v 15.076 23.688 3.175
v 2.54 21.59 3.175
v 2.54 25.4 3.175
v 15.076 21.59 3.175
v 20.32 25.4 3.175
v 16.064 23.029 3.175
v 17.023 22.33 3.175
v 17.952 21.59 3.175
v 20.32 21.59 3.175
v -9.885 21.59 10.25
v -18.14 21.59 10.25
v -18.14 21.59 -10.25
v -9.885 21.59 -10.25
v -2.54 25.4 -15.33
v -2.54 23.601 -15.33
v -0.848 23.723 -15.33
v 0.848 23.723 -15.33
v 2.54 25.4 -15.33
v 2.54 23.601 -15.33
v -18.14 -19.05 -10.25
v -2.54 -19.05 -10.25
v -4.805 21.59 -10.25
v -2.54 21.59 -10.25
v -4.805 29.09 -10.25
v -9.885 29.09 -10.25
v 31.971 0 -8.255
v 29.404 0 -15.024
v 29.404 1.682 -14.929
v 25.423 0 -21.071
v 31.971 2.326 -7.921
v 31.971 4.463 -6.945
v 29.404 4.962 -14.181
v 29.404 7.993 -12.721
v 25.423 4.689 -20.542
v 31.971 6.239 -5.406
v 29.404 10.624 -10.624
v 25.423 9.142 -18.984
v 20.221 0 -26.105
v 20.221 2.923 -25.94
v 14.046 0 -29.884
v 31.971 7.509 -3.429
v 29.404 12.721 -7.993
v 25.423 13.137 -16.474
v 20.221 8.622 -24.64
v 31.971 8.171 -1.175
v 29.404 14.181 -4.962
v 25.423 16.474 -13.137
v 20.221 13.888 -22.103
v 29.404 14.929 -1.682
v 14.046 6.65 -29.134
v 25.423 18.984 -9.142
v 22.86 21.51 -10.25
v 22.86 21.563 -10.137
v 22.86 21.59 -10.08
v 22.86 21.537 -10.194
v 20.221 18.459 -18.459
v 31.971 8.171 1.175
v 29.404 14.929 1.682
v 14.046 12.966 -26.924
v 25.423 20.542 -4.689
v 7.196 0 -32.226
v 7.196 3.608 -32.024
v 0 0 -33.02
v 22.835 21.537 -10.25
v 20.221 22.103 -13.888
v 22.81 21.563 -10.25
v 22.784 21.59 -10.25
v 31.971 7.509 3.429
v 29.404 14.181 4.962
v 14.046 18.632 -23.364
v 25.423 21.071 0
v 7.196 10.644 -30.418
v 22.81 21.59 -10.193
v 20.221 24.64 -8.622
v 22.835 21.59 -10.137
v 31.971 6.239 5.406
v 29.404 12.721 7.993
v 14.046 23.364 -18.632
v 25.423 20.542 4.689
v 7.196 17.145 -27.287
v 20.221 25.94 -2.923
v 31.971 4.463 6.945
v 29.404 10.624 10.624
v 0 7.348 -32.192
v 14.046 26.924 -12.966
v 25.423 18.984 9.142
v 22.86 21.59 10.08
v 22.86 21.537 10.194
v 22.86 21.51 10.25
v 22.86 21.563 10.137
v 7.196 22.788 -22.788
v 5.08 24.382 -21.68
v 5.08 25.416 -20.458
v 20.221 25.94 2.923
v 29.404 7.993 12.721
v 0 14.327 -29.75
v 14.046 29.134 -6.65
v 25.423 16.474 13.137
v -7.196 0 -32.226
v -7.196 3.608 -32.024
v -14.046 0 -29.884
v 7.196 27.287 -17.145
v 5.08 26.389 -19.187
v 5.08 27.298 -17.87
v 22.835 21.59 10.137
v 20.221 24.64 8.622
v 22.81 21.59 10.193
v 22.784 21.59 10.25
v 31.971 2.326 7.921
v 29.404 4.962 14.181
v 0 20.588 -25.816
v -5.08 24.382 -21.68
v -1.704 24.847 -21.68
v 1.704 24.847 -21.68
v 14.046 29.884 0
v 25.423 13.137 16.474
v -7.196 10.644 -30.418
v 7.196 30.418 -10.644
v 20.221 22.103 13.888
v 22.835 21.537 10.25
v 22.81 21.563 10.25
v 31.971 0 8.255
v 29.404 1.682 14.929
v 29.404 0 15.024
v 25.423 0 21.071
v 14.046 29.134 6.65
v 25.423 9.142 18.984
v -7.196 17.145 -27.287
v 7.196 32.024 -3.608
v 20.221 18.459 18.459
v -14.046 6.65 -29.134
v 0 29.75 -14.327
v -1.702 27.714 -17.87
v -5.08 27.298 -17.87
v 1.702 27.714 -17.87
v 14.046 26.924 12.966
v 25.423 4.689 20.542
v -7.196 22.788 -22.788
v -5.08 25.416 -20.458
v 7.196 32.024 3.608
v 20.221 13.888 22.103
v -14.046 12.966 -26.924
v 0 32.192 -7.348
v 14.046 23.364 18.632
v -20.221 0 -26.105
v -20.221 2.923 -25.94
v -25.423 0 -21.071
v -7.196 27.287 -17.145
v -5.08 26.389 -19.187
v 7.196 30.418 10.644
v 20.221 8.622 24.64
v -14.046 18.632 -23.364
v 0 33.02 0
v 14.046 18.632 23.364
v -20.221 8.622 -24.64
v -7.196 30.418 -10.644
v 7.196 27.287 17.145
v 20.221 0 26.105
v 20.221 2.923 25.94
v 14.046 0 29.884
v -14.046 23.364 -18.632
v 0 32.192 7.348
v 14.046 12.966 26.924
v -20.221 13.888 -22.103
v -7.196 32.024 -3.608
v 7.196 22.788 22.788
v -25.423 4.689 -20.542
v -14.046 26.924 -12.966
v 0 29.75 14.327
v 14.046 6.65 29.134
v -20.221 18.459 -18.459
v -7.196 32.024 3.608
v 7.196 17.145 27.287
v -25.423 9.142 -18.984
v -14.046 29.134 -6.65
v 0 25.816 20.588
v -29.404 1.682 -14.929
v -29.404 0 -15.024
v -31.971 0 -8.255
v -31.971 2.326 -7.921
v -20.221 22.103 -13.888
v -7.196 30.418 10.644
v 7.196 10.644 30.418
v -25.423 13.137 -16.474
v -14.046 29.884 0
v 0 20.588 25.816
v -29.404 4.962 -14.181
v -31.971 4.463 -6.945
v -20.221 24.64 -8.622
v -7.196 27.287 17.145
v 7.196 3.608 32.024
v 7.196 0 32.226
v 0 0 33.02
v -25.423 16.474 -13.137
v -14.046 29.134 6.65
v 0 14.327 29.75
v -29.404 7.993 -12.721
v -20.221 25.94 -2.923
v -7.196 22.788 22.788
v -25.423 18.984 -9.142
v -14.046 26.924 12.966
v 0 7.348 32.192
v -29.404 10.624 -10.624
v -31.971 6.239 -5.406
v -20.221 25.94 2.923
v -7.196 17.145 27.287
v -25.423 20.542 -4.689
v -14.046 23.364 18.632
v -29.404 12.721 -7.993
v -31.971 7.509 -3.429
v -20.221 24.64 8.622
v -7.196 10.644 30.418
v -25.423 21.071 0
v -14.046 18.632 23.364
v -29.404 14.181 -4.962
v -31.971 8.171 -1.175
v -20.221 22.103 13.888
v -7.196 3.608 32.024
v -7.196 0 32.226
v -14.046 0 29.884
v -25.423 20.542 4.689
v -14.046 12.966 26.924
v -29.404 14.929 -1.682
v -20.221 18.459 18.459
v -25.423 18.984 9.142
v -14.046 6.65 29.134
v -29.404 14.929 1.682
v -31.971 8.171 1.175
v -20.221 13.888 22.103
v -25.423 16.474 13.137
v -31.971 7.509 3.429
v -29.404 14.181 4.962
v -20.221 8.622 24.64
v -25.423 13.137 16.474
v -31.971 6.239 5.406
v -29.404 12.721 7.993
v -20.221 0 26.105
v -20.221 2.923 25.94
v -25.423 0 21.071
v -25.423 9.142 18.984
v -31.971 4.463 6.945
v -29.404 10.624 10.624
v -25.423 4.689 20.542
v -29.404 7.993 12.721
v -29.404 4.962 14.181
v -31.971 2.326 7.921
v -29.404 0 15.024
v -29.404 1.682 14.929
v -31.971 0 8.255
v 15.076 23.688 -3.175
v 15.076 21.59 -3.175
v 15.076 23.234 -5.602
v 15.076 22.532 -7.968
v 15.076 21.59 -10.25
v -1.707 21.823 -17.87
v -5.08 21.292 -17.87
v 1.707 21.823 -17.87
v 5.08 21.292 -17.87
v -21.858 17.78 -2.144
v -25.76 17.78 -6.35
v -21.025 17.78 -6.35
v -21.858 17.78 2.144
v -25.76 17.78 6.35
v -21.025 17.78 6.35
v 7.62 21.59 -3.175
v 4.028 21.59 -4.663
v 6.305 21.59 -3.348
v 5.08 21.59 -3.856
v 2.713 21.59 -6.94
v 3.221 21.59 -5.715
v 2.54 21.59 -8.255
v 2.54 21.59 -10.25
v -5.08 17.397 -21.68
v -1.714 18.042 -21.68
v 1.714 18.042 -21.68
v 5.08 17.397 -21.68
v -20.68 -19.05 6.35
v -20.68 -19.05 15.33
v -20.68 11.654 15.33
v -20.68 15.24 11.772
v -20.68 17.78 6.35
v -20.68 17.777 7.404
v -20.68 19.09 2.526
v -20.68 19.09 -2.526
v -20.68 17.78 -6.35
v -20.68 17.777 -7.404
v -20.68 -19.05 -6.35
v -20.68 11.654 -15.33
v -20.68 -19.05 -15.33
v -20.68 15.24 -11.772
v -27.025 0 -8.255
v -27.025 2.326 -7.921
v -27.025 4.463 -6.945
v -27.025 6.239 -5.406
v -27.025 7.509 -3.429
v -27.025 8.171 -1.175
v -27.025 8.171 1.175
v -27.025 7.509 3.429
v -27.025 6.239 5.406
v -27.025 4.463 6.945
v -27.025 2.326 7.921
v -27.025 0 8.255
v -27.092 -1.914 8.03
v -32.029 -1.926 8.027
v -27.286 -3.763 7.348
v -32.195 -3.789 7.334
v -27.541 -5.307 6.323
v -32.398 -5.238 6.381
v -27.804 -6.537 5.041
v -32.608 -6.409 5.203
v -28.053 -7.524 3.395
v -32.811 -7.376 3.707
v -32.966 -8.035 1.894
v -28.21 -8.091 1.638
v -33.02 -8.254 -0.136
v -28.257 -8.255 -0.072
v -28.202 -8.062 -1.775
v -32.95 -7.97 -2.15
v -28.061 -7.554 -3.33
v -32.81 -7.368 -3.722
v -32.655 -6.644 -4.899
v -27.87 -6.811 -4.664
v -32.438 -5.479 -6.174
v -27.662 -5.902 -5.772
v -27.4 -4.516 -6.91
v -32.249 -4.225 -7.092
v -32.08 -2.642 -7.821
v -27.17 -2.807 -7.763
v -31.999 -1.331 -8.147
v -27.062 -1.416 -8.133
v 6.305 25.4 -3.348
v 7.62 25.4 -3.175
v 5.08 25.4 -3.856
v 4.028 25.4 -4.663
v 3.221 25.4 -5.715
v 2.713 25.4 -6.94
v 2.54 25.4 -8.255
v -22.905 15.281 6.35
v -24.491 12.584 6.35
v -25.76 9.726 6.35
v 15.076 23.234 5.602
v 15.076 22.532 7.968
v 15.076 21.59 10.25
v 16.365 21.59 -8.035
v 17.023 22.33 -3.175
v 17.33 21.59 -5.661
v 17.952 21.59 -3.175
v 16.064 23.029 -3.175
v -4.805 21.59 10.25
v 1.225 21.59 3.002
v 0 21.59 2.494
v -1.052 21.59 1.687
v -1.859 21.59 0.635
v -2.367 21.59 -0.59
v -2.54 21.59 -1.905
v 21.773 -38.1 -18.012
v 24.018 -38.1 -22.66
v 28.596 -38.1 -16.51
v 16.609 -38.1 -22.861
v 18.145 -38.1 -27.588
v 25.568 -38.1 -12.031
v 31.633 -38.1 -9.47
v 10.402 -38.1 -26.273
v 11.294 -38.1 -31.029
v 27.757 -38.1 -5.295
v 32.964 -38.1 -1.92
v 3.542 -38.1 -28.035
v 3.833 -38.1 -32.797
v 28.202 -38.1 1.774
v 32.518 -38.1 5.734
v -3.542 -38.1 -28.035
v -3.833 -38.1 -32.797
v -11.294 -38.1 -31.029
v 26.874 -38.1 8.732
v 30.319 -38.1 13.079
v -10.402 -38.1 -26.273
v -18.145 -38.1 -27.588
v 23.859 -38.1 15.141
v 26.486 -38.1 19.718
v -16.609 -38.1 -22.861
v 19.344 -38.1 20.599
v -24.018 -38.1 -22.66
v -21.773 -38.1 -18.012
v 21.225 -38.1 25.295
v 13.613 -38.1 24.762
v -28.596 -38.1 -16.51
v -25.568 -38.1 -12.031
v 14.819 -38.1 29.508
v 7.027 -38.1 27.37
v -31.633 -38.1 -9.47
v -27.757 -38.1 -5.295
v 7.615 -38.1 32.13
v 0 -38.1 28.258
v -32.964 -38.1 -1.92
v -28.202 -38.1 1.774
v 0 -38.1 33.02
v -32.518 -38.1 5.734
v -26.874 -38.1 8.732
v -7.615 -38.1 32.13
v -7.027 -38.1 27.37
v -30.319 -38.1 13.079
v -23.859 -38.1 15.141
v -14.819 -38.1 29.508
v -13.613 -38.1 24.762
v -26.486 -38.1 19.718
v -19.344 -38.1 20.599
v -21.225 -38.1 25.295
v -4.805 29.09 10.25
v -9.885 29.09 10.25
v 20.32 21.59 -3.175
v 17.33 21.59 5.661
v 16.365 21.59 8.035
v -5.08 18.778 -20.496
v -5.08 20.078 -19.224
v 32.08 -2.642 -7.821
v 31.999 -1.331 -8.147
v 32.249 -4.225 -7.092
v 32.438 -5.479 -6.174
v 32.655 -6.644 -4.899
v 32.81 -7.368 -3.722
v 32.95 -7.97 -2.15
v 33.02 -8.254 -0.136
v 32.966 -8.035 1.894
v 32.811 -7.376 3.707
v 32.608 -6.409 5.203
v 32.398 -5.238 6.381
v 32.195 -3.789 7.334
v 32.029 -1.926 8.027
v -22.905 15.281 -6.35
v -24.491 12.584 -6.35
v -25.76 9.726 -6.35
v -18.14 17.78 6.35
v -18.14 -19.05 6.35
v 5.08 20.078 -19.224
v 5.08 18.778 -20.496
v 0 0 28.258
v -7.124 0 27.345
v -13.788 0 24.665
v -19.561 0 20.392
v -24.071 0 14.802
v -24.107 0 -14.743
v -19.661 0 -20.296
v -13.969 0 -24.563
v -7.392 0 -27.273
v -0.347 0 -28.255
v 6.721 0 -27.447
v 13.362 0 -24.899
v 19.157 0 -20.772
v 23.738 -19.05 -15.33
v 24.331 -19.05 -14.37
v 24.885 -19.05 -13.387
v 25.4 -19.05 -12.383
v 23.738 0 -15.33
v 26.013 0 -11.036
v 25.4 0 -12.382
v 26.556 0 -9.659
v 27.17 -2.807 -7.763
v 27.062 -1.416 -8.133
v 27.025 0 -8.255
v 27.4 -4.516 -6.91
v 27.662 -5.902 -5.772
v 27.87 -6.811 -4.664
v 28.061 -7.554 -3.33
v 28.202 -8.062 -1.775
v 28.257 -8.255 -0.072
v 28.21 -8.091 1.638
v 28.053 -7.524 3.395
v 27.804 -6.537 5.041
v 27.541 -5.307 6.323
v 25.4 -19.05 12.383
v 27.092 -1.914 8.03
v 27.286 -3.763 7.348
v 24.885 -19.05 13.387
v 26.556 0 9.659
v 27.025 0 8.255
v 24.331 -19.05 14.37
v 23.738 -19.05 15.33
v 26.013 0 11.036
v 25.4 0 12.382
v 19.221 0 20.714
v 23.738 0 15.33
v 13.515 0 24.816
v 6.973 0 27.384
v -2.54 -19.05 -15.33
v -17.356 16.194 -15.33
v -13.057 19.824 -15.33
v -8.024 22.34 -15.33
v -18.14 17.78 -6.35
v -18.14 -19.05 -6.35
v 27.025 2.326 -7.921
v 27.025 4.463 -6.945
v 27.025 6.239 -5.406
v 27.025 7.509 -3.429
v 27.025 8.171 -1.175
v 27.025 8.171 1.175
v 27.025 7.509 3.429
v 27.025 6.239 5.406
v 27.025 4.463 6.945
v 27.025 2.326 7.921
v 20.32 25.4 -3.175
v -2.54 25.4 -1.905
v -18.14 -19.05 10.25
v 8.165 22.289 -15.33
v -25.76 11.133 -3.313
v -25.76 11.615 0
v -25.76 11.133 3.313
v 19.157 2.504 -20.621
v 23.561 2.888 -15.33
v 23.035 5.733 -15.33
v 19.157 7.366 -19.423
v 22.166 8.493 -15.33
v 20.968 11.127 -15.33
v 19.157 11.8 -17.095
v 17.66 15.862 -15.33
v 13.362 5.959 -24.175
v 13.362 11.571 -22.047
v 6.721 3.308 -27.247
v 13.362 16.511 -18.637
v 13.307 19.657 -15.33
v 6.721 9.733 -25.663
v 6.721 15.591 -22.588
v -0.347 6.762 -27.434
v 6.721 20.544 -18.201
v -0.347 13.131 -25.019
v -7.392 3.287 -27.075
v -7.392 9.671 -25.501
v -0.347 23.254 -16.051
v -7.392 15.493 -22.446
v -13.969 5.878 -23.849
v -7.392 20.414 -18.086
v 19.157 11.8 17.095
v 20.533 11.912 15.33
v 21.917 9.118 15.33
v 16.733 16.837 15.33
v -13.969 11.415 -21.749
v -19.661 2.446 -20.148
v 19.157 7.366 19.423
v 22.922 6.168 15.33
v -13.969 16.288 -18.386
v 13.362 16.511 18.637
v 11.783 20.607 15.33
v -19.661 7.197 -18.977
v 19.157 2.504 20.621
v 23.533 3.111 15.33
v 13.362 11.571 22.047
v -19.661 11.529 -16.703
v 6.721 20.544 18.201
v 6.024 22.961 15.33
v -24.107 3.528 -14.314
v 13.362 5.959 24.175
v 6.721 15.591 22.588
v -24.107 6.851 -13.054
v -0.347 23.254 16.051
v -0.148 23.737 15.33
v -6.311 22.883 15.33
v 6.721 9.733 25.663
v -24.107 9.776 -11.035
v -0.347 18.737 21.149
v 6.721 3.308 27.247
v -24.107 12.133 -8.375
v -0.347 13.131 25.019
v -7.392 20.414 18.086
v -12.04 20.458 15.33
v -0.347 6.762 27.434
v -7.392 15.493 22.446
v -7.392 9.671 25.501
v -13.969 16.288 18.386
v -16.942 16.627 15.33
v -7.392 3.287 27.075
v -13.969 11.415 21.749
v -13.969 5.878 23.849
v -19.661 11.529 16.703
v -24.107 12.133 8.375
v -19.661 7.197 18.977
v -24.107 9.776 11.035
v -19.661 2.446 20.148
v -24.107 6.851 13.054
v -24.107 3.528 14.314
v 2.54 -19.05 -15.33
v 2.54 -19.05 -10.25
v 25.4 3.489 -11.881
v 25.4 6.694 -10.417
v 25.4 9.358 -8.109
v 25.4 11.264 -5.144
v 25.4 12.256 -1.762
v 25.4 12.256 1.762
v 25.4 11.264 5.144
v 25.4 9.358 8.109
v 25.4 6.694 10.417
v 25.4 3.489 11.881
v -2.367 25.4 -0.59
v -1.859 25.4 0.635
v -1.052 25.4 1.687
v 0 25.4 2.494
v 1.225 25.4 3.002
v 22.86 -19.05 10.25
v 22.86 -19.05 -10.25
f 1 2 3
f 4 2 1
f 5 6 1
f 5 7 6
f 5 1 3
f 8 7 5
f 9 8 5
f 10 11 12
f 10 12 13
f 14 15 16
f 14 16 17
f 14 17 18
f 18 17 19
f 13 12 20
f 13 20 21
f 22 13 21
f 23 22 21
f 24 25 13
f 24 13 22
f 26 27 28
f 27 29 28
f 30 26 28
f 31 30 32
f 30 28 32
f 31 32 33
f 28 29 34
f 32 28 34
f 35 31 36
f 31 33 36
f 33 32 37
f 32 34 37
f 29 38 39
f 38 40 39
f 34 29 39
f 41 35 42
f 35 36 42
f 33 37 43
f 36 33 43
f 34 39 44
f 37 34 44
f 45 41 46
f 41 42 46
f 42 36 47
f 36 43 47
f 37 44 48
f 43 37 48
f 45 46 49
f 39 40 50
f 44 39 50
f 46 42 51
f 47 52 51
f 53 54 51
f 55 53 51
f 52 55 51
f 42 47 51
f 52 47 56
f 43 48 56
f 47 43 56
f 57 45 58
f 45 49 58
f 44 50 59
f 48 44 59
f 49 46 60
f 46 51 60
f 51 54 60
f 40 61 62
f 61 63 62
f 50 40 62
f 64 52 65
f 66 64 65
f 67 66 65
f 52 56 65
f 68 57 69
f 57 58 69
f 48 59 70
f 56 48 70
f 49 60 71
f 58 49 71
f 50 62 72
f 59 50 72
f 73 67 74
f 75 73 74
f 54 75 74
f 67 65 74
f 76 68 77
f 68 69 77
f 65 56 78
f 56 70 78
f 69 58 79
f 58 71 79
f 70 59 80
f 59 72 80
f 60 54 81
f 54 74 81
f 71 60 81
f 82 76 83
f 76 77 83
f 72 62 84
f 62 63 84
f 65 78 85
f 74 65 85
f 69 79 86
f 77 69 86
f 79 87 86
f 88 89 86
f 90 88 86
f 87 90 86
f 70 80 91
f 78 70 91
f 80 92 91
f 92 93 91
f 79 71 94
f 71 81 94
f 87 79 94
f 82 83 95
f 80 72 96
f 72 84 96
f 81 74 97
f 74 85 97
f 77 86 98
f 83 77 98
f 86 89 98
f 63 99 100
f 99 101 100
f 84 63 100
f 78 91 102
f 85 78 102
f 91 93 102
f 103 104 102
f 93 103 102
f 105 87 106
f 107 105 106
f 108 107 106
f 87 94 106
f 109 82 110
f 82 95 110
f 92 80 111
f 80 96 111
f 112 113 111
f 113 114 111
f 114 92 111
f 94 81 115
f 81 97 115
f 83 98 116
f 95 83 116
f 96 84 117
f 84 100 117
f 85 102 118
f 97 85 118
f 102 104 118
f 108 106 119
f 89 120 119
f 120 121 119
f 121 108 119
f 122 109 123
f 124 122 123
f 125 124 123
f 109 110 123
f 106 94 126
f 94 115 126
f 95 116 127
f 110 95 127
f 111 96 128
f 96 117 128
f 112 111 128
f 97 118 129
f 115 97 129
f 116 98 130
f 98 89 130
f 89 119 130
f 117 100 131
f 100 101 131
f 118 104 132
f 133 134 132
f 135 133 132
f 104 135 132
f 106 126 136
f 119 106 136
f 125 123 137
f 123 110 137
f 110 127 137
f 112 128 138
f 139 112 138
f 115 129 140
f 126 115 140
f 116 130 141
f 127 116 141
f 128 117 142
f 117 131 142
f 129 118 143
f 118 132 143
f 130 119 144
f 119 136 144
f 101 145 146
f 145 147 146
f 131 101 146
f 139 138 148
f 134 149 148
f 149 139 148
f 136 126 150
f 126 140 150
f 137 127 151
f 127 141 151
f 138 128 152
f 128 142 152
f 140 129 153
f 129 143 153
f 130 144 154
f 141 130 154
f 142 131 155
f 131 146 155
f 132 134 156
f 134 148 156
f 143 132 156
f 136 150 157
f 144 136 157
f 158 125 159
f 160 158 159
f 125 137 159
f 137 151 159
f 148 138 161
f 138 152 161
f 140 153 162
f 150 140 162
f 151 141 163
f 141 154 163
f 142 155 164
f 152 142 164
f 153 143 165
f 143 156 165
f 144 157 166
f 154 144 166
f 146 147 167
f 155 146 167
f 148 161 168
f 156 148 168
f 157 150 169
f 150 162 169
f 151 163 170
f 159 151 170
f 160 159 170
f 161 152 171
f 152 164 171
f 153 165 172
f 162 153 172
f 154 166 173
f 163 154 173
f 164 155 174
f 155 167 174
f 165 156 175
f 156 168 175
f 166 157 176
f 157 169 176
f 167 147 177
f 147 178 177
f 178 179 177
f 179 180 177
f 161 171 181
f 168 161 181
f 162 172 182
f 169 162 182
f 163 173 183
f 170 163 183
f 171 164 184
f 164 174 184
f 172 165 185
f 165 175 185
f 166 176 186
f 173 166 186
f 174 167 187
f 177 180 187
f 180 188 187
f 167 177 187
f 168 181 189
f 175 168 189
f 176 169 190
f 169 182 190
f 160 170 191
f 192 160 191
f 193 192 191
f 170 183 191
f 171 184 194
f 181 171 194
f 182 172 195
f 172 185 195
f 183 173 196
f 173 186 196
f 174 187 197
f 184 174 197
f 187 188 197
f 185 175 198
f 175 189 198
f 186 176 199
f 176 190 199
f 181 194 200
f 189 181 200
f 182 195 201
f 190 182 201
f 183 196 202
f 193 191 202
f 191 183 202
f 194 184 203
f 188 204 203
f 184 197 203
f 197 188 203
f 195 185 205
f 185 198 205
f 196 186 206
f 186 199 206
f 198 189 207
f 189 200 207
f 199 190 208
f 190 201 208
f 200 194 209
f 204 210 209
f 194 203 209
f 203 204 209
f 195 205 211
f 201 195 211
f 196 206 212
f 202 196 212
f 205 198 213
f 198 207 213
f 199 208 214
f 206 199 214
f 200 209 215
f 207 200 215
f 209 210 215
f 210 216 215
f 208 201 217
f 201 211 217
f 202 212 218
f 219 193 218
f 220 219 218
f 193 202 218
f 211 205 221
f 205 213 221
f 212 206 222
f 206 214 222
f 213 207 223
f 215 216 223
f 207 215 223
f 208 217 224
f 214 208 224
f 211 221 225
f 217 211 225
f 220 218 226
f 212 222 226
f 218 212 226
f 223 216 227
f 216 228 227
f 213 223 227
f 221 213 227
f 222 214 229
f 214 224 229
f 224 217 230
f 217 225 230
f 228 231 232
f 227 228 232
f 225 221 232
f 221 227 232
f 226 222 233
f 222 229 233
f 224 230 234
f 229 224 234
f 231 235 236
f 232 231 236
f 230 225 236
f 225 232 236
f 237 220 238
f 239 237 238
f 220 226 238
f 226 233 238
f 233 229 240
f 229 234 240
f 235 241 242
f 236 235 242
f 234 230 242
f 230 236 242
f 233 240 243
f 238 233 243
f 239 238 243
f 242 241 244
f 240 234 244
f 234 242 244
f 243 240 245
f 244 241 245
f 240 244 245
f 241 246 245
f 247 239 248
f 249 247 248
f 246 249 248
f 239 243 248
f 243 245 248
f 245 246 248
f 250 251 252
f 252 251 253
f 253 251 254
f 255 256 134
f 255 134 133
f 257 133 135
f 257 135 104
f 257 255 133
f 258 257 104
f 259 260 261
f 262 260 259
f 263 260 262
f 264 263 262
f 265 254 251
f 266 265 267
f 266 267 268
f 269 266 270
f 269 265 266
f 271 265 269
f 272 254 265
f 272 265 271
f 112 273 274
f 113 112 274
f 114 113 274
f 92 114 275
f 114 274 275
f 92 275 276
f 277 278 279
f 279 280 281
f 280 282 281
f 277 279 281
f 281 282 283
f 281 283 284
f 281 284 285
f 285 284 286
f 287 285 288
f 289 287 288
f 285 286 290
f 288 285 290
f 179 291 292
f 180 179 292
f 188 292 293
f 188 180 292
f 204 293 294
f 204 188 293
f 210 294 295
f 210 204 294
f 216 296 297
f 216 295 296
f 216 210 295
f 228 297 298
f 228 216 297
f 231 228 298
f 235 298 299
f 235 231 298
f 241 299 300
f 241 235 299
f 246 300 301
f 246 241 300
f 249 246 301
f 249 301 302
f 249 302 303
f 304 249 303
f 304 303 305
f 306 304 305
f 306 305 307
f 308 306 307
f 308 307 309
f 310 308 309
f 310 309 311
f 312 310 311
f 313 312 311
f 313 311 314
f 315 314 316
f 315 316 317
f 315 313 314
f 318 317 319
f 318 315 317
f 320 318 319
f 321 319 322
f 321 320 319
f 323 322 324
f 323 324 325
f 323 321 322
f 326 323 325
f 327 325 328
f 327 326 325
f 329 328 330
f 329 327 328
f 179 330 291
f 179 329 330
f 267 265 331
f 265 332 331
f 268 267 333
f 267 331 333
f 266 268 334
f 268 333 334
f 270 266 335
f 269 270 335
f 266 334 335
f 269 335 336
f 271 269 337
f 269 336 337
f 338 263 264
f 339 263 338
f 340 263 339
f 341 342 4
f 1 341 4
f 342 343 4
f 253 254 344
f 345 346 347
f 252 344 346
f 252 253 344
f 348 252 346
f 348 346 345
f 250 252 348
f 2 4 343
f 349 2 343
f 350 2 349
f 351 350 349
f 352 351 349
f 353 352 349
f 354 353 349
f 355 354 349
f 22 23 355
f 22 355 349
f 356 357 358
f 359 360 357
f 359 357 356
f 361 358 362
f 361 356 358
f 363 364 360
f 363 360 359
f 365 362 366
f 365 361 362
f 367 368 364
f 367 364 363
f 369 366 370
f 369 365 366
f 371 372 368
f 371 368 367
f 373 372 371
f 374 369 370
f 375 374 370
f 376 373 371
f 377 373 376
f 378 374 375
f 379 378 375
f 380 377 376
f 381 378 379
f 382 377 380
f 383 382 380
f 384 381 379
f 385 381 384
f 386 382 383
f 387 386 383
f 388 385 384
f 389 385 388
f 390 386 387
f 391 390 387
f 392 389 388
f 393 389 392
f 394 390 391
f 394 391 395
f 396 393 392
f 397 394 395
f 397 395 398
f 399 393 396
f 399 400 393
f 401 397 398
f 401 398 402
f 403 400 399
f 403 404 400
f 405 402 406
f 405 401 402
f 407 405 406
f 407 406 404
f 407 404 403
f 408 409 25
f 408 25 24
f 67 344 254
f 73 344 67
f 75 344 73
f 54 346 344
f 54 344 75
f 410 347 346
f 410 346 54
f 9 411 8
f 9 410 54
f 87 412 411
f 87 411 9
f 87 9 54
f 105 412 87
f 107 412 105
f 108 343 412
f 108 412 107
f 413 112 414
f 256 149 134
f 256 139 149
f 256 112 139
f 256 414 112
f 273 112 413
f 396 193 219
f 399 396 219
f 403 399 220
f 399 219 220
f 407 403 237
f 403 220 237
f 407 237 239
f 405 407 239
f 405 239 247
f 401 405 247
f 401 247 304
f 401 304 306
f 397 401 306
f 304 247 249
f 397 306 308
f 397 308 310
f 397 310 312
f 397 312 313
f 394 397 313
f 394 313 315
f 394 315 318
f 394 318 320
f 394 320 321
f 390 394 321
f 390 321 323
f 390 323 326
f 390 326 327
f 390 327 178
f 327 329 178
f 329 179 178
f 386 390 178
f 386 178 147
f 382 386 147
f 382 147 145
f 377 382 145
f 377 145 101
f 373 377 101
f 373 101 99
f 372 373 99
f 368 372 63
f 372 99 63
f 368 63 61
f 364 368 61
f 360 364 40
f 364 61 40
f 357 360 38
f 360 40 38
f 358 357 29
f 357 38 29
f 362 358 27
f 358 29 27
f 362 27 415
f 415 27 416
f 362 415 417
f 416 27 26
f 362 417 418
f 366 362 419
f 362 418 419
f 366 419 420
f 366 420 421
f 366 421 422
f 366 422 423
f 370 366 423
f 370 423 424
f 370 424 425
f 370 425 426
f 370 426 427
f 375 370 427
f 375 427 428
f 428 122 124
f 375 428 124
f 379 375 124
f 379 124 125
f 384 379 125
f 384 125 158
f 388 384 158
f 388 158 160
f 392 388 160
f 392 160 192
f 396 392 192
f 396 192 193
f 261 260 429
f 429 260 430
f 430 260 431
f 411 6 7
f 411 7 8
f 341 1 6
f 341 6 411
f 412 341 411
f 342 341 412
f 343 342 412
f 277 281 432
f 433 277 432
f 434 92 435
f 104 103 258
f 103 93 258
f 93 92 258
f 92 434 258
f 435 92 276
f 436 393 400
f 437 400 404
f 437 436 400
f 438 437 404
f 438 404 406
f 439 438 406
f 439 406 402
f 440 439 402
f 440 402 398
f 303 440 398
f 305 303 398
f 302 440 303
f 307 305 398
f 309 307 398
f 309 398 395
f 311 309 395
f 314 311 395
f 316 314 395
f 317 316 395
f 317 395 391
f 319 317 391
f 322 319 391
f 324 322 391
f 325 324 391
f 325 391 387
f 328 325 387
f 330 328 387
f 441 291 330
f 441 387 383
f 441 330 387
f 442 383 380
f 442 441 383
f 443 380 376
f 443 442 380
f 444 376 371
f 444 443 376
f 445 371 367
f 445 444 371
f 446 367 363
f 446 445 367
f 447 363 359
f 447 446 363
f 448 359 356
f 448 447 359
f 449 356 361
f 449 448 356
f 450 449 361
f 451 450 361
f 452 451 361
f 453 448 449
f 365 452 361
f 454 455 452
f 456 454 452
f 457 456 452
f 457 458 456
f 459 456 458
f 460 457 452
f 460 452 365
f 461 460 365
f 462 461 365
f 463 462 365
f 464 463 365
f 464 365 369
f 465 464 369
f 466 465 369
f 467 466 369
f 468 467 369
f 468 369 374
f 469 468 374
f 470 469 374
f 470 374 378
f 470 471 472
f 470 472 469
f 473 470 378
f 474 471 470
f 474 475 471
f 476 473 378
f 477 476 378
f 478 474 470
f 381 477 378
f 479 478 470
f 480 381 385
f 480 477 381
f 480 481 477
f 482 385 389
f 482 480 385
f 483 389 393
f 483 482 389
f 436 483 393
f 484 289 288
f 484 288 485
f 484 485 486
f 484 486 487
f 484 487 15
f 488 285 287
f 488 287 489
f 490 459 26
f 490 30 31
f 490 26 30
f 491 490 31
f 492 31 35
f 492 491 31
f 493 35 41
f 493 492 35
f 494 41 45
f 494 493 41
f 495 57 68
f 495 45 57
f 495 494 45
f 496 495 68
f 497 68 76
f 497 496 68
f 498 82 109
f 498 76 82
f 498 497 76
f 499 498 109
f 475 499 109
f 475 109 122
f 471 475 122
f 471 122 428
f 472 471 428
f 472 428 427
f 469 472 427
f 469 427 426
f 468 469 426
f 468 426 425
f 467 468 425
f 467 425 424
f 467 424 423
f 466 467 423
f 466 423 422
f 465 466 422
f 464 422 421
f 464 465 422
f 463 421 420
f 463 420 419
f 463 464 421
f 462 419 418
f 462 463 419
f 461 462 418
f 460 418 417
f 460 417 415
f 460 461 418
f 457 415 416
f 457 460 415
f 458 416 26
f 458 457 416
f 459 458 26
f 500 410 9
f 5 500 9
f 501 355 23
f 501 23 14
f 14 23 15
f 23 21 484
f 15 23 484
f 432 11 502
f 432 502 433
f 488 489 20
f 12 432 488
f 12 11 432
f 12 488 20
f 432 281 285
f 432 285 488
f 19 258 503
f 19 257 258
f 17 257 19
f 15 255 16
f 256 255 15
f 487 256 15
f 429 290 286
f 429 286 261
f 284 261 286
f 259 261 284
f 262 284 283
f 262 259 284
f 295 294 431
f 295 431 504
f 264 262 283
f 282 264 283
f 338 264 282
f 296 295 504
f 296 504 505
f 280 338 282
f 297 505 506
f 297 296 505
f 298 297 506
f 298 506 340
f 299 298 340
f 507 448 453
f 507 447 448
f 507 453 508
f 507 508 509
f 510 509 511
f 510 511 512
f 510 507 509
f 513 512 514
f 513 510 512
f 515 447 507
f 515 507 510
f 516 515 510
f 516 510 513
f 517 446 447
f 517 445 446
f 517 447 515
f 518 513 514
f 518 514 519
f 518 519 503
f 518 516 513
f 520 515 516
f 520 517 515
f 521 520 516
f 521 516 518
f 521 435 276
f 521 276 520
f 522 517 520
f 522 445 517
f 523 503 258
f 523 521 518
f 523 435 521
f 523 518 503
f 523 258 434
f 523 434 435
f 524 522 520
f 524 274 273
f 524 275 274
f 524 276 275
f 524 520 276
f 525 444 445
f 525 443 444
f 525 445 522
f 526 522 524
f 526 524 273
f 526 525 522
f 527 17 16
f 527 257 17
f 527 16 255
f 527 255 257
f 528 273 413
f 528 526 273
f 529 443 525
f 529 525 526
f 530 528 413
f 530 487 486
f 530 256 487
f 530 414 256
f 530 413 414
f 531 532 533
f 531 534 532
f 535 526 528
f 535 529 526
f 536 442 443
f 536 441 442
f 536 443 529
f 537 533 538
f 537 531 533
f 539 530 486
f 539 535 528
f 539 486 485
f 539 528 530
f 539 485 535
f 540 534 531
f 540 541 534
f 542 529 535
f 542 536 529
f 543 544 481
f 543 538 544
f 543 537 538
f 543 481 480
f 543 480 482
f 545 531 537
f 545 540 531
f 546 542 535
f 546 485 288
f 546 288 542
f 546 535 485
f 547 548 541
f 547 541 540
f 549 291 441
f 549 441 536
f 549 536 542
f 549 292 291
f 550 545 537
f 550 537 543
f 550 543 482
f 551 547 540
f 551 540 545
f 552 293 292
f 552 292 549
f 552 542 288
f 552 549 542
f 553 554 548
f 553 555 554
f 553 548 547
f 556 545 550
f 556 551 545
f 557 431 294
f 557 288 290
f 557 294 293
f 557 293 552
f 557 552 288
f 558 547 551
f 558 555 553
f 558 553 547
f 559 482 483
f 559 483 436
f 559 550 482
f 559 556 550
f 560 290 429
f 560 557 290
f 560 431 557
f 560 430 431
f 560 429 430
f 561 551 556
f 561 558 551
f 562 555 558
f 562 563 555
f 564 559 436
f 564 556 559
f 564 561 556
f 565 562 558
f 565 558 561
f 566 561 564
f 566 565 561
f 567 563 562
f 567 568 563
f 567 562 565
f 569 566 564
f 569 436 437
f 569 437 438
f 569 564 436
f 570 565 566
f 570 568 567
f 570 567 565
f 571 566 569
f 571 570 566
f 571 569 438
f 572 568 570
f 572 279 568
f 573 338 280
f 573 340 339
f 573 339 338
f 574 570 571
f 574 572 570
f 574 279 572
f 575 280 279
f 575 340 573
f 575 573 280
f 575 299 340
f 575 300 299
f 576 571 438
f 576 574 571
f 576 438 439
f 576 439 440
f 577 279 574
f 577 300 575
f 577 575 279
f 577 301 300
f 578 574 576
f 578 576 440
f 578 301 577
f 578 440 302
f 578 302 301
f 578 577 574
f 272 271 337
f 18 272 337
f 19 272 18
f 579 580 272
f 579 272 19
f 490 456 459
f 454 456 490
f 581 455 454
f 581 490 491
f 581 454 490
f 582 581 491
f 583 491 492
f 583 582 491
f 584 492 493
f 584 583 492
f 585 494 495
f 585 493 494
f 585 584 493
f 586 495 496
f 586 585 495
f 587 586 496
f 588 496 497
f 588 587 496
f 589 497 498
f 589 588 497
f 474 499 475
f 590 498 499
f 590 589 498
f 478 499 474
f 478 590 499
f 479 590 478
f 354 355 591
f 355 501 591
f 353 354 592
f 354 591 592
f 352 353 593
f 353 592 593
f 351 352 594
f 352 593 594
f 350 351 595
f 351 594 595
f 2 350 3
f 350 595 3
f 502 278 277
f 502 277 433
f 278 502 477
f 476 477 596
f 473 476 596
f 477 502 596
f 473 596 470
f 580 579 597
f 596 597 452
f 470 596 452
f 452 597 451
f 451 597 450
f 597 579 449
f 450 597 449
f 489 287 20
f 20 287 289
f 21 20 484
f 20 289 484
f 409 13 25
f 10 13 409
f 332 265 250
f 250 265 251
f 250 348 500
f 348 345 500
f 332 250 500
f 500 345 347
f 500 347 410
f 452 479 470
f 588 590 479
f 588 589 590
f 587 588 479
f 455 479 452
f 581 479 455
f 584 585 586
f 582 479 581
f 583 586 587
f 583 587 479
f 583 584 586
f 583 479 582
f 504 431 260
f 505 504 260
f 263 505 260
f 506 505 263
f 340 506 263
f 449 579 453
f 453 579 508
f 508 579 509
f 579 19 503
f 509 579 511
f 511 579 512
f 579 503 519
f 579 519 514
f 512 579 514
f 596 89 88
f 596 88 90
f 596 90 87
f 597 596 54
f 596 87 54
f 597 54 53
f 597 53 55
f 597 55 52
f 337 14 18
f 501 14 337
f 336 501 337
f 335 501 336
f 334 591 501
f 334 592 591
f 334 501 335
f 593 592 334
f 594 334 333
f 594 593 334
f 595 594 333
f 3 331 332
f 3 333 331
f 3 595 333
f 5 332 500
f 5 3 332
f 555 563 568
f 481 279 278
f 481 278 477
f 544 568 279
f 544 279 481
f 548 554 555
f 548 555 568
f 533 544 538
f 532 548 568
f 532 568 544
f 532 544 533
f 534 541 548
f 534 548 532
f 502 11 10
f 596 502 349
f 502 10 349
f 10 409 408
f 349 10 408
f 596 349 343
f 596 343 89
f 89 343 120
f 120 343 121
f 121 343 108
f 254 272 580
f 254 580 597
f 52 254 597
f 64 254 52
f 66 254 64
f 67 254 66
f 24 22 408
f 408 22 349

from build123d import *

# Parameters (mm, degrees)
REVOLVE1_ANGLE                  = 180
SKETCH3_R                       = 33.02
BOSS_EXTRUDE1_DEPTH             = 38.1
SHELL1_T                        = -4.7625
CUT_EXTRUDE1_DEPTH              = 61.26815743
CUT_EXTRUDE1_DEPTH_BACK         = 61.26815743
SKETCH4_R                       = 8.255
BOSS_EXTRUDE4_REACH             = 62.268
BOSS_EXTRUDE4_END_RADIUS        = 28.2575
SKETCH5_W                       = 46.08
SKETCH5_H                       = 30.66
SKETCH5_W_2                     = 41
SKETCH5_H_2                     = 20.5
BOSS_EXTRUDE4_DIRECTION_2_DEPTH = 19.05
BOSS_EXTRUDE6_REACH             = 77.786
SKETCH8_W                       = 33.216329336
SKETCH8_H                       = 20.5
SKETCH9_W                       = 5.08
SKETCH9_H                       = 20.5
CUT_EXTRUDE2_DEPTH              = 7.5
SKETCH15_W                      = 3.063670664
SKETCH15_H                      = 20.5
SKETCH15_W_2                    = 7.783670664
CUT_EXTRUDE5_DEPTH              = 76.786126205
SKETCH10_W                      = 10.16
SKETCH10_H                      = 3.81
CUT_EXTRUDE3_DEPTH              = 70.942302745
SKETCH11_W                      = 7.62
SKETCH11_H                      = 12.7
CUT_EXTRUDE4_DEPTH              = 36.83
SKETCH16_W                      = 5.08
SKETCH16_H                      = 5.08
CUT_EXTRUDE6_DEPTH              = 40.64
SKETCH17_W                      = 22.86
SKETCH17_H                      = 6.35
CUT_EXTRUDE7_DEPTH              = 3.81
SKETCH18_W                      = 5.08
SKETCH18_H                      = 12.155
CUT_EXTRUDE8_DEPTH              = 3.81
FILLET1_R                       = 5.08


with BuildPart() as part:
    # Sketch2 → Revolve1 (revolve)
    with BuildSketch(Plane(origin=(0, 0, 0), x_dir=(1, 0, 0), z_dir=(0, 1, 0))):
        with BuildLine():
            Line((-33.02, 0), (33.02, 0))
            ThreePointArc((33.02, 0), (0, 33.02), (-33.02, 0))
        make_face()
    revolve(axis=Axis((-33.02, 0, 0), (1, 0, 0)), revolution_arc=REVOLVE1_ANGLE)

    # Sketch3 → Boss-Extrude1 (add)
    with BuildSketch(Plane.XZ):
        with Locations(Location((0, 0, 0), (0, 0, 90))):
            Circle(SKETCH3_R)
    extrude(amount=BOSS_EXTRUDE1_DEPTH)

    # Shell1
    shell1_openings = [part.faces().sort_by_distance(p)[0] for p in [
        (0, -38.1, 0),
    ]]
    offset(amount=SHELL1_T, openings=shell1_openings, kind=Kind.INTERSECTION)

    # Sketch4 → Cut-Extrude1 (cut, two sides: drawn at the far end of the back side and taken through both)
    with BuildSketch(Plane(origin=(0, 0, 0), x_dir=(0, 0, -1), z_dir=(1, 0, 0)).offset(-CUT_EXTRUDE1_DEPTH_BACK)):
        Circle(SKETCH4_R)
    extrude(amount=CUT_EXTRUDE1_DEPTH + CUT_EXTRUDE1_DEPTH_BACK, mode=Mode.SUBTRACT)

    # Boss-Extrude4: up to this sphere (the profile starts inside it)
    boss_extrude4_end = Location((0, 0, 0)) * Sphere(BOSS_EXTRUDE4_END_RADIUS, mode=Mode.PRIVATE)
    # Sketch5 → Boss-Extrude4 (add, up to the surface)
    with BuildSketch(Plane(origin=(0, 0, 0), x_dir=(1, 0, 0), z_dir=(0, 1, 0)), mode=Mode.PRIVATE) as boss_extrude4_sk1:
        with Locations((2.36, 0)):
            Rectangle(SKETCH5_W, SKETCH5_H)
        with Locations((2.36, 0)):
            Rectangle(SKETCH5_W_2, SKETCH5_H_2, mode=Mode.SUBTRACT)
    boss_extrude4_tool1 = extrude(boss_extrude4_sk1.sketch, amount=BOSS_EXTRUDE4_REACH, mode=Mode.PRIVATE) & boss_extrude4_end
    add(boss_extrude4_tool1.solids().sort_by_distance((2.36, 0, -14.77652))[0])

    # Sketch5 → Boss-Extrude4 direction 2 (add)
    with BuildSketch(Plane(origin=(0, 0, 0), x_dir=(1, 0, 0), z_dir=(0, 1, 0))):
        with Locations((2.36, 0)):
            Rectangle(SKETCH5_W, SKETCH5_H)
        with Locations((2.36, 0)):
            Rectangle(SKETCH5_W_2, SKETCH5_H_2, mode=Mode.SUBTRACT)
    extrude(amount=-BOSS_EXTRUDE4_DIRECTION_2_DEPTH)

    # Sketch8 → Boss-Extrude6 (add, up to next)
    with BuildSketch(Plane(origin=(0, 21.59, 0), x_dir=(1, 0, 0), z_dir=(0, 1, 0)), mode=Mode.PRIVATE) as boss_extrude6_sk1:
        with Locations((-1.531835332, 0)):
            Rectangle(SKETCH8_W, SKETCH8_H)
    boss_extrude6_tool1 = extrude(boss_extrude6_sk1.sketch, amount=BOSS_EXTRUDE6_REACH, mode=Mode.PRIVATE) - part.part
    add(boss_extrude6_tool1.solids().sort_by_distance((-1.531835, 21.59, 0))[0])

    # Sketch9 → Cut-Extrude2 (cut)
    with BuildSketch(Plane.XZ.offset(-21.59)):
        with Locations((-7.345, 0)):
            Rectangle(SKETCH9_W, SKETCH9_H)
    extrude(amount=-CUT_EXTRUDE2_DEPTH, mode=Mode.SUBTRACT)

    # Sketch15 → Cut-Extrude5 (cut, through all)
    with BuildSketch(Plane.XZ.offset(-21.59)):
        with Locations((-16.608164668, 0)):
            Rectangle(SKETCH15_W, SKETCH15_H)
        with Locations((18.968164668, 0)):
            Rectangle(SKETCH15_W_2, SKETCH15_H)
    extrude(amount=CUT_EXTRUDE5_DEPTH, mode=Mode.SUBTRACT)

    # Sketch10 → Cut-Extrude3 (cut, through all)
    with BuildSketch(Plane.XZ.offset(19.05)):
        with Locations((0, -19.775)):
            Rectangle(SKETCH10_W, SKETCH10_H)
    extrude(amount=-CUT_EXTRUDE3_DEPTH, mode=Mode.SUBTRACT)

    # Sketch11 → Cut-Extrude4 (cut)
    with BuildSketch(Plane.XZ.offset(19.05)):
        with Locations((-21.95, 0)):
            Rectangle(SKETCH11_W, SKETCH11_H)
    extrude(amount=-CUT_EXTRUDE4_DEPTH, mode=Mode.SUBTRACT)

    # Sketch16 → Cut-Extrude6 (cut)
    with BuildSketch(Plane(origin=(0, -19.05, 0), x_dir=(-1, 0, 0), z_dir=(0, -1, 0))):
        with Locations((0, 12.79)):
            Rectangle(SKETCH16_W, SKETCH16_H)
    extrude(amount=-CUT_EXTRUDE6_DEPTH, mode=Mode.SUBTRACT)

    # Sketch17 → Cut-Extrude7 (cut)
    with BuildSketch(Plane.XZ.offset(-21.59)):
        with Locations((8.89, 0)):
            Rectangle(SKETCH17_W, SKETCH17_H)
    extrude(amount=-CUT_EXTRUDE7_DEPTH, mode=Mode.SUBTRACT)

    # Sketch18 → Cut-Extrude8 (cut)
    with BuildSketch(Plane.XZ.offset(-21.59)):
        with Locations((0, -9.2525)):
            Rectangle(SKETCH18_W, SKETCH18_H)
    extrude(amount=-CUT_EXTRUDE8_DEPTH, mode=Mode.SUBTRACT)

    # Fillet1
    fillet1_edges = [part.edges().sort_by_distance(p)[0] for p in [
        (-2.54, 23.495, 3.175),
        (2.54, 23.495, -3.175),
    ]]
    fillet(fillet1_edges, radius=FILLET1_R)


solid = part.part
